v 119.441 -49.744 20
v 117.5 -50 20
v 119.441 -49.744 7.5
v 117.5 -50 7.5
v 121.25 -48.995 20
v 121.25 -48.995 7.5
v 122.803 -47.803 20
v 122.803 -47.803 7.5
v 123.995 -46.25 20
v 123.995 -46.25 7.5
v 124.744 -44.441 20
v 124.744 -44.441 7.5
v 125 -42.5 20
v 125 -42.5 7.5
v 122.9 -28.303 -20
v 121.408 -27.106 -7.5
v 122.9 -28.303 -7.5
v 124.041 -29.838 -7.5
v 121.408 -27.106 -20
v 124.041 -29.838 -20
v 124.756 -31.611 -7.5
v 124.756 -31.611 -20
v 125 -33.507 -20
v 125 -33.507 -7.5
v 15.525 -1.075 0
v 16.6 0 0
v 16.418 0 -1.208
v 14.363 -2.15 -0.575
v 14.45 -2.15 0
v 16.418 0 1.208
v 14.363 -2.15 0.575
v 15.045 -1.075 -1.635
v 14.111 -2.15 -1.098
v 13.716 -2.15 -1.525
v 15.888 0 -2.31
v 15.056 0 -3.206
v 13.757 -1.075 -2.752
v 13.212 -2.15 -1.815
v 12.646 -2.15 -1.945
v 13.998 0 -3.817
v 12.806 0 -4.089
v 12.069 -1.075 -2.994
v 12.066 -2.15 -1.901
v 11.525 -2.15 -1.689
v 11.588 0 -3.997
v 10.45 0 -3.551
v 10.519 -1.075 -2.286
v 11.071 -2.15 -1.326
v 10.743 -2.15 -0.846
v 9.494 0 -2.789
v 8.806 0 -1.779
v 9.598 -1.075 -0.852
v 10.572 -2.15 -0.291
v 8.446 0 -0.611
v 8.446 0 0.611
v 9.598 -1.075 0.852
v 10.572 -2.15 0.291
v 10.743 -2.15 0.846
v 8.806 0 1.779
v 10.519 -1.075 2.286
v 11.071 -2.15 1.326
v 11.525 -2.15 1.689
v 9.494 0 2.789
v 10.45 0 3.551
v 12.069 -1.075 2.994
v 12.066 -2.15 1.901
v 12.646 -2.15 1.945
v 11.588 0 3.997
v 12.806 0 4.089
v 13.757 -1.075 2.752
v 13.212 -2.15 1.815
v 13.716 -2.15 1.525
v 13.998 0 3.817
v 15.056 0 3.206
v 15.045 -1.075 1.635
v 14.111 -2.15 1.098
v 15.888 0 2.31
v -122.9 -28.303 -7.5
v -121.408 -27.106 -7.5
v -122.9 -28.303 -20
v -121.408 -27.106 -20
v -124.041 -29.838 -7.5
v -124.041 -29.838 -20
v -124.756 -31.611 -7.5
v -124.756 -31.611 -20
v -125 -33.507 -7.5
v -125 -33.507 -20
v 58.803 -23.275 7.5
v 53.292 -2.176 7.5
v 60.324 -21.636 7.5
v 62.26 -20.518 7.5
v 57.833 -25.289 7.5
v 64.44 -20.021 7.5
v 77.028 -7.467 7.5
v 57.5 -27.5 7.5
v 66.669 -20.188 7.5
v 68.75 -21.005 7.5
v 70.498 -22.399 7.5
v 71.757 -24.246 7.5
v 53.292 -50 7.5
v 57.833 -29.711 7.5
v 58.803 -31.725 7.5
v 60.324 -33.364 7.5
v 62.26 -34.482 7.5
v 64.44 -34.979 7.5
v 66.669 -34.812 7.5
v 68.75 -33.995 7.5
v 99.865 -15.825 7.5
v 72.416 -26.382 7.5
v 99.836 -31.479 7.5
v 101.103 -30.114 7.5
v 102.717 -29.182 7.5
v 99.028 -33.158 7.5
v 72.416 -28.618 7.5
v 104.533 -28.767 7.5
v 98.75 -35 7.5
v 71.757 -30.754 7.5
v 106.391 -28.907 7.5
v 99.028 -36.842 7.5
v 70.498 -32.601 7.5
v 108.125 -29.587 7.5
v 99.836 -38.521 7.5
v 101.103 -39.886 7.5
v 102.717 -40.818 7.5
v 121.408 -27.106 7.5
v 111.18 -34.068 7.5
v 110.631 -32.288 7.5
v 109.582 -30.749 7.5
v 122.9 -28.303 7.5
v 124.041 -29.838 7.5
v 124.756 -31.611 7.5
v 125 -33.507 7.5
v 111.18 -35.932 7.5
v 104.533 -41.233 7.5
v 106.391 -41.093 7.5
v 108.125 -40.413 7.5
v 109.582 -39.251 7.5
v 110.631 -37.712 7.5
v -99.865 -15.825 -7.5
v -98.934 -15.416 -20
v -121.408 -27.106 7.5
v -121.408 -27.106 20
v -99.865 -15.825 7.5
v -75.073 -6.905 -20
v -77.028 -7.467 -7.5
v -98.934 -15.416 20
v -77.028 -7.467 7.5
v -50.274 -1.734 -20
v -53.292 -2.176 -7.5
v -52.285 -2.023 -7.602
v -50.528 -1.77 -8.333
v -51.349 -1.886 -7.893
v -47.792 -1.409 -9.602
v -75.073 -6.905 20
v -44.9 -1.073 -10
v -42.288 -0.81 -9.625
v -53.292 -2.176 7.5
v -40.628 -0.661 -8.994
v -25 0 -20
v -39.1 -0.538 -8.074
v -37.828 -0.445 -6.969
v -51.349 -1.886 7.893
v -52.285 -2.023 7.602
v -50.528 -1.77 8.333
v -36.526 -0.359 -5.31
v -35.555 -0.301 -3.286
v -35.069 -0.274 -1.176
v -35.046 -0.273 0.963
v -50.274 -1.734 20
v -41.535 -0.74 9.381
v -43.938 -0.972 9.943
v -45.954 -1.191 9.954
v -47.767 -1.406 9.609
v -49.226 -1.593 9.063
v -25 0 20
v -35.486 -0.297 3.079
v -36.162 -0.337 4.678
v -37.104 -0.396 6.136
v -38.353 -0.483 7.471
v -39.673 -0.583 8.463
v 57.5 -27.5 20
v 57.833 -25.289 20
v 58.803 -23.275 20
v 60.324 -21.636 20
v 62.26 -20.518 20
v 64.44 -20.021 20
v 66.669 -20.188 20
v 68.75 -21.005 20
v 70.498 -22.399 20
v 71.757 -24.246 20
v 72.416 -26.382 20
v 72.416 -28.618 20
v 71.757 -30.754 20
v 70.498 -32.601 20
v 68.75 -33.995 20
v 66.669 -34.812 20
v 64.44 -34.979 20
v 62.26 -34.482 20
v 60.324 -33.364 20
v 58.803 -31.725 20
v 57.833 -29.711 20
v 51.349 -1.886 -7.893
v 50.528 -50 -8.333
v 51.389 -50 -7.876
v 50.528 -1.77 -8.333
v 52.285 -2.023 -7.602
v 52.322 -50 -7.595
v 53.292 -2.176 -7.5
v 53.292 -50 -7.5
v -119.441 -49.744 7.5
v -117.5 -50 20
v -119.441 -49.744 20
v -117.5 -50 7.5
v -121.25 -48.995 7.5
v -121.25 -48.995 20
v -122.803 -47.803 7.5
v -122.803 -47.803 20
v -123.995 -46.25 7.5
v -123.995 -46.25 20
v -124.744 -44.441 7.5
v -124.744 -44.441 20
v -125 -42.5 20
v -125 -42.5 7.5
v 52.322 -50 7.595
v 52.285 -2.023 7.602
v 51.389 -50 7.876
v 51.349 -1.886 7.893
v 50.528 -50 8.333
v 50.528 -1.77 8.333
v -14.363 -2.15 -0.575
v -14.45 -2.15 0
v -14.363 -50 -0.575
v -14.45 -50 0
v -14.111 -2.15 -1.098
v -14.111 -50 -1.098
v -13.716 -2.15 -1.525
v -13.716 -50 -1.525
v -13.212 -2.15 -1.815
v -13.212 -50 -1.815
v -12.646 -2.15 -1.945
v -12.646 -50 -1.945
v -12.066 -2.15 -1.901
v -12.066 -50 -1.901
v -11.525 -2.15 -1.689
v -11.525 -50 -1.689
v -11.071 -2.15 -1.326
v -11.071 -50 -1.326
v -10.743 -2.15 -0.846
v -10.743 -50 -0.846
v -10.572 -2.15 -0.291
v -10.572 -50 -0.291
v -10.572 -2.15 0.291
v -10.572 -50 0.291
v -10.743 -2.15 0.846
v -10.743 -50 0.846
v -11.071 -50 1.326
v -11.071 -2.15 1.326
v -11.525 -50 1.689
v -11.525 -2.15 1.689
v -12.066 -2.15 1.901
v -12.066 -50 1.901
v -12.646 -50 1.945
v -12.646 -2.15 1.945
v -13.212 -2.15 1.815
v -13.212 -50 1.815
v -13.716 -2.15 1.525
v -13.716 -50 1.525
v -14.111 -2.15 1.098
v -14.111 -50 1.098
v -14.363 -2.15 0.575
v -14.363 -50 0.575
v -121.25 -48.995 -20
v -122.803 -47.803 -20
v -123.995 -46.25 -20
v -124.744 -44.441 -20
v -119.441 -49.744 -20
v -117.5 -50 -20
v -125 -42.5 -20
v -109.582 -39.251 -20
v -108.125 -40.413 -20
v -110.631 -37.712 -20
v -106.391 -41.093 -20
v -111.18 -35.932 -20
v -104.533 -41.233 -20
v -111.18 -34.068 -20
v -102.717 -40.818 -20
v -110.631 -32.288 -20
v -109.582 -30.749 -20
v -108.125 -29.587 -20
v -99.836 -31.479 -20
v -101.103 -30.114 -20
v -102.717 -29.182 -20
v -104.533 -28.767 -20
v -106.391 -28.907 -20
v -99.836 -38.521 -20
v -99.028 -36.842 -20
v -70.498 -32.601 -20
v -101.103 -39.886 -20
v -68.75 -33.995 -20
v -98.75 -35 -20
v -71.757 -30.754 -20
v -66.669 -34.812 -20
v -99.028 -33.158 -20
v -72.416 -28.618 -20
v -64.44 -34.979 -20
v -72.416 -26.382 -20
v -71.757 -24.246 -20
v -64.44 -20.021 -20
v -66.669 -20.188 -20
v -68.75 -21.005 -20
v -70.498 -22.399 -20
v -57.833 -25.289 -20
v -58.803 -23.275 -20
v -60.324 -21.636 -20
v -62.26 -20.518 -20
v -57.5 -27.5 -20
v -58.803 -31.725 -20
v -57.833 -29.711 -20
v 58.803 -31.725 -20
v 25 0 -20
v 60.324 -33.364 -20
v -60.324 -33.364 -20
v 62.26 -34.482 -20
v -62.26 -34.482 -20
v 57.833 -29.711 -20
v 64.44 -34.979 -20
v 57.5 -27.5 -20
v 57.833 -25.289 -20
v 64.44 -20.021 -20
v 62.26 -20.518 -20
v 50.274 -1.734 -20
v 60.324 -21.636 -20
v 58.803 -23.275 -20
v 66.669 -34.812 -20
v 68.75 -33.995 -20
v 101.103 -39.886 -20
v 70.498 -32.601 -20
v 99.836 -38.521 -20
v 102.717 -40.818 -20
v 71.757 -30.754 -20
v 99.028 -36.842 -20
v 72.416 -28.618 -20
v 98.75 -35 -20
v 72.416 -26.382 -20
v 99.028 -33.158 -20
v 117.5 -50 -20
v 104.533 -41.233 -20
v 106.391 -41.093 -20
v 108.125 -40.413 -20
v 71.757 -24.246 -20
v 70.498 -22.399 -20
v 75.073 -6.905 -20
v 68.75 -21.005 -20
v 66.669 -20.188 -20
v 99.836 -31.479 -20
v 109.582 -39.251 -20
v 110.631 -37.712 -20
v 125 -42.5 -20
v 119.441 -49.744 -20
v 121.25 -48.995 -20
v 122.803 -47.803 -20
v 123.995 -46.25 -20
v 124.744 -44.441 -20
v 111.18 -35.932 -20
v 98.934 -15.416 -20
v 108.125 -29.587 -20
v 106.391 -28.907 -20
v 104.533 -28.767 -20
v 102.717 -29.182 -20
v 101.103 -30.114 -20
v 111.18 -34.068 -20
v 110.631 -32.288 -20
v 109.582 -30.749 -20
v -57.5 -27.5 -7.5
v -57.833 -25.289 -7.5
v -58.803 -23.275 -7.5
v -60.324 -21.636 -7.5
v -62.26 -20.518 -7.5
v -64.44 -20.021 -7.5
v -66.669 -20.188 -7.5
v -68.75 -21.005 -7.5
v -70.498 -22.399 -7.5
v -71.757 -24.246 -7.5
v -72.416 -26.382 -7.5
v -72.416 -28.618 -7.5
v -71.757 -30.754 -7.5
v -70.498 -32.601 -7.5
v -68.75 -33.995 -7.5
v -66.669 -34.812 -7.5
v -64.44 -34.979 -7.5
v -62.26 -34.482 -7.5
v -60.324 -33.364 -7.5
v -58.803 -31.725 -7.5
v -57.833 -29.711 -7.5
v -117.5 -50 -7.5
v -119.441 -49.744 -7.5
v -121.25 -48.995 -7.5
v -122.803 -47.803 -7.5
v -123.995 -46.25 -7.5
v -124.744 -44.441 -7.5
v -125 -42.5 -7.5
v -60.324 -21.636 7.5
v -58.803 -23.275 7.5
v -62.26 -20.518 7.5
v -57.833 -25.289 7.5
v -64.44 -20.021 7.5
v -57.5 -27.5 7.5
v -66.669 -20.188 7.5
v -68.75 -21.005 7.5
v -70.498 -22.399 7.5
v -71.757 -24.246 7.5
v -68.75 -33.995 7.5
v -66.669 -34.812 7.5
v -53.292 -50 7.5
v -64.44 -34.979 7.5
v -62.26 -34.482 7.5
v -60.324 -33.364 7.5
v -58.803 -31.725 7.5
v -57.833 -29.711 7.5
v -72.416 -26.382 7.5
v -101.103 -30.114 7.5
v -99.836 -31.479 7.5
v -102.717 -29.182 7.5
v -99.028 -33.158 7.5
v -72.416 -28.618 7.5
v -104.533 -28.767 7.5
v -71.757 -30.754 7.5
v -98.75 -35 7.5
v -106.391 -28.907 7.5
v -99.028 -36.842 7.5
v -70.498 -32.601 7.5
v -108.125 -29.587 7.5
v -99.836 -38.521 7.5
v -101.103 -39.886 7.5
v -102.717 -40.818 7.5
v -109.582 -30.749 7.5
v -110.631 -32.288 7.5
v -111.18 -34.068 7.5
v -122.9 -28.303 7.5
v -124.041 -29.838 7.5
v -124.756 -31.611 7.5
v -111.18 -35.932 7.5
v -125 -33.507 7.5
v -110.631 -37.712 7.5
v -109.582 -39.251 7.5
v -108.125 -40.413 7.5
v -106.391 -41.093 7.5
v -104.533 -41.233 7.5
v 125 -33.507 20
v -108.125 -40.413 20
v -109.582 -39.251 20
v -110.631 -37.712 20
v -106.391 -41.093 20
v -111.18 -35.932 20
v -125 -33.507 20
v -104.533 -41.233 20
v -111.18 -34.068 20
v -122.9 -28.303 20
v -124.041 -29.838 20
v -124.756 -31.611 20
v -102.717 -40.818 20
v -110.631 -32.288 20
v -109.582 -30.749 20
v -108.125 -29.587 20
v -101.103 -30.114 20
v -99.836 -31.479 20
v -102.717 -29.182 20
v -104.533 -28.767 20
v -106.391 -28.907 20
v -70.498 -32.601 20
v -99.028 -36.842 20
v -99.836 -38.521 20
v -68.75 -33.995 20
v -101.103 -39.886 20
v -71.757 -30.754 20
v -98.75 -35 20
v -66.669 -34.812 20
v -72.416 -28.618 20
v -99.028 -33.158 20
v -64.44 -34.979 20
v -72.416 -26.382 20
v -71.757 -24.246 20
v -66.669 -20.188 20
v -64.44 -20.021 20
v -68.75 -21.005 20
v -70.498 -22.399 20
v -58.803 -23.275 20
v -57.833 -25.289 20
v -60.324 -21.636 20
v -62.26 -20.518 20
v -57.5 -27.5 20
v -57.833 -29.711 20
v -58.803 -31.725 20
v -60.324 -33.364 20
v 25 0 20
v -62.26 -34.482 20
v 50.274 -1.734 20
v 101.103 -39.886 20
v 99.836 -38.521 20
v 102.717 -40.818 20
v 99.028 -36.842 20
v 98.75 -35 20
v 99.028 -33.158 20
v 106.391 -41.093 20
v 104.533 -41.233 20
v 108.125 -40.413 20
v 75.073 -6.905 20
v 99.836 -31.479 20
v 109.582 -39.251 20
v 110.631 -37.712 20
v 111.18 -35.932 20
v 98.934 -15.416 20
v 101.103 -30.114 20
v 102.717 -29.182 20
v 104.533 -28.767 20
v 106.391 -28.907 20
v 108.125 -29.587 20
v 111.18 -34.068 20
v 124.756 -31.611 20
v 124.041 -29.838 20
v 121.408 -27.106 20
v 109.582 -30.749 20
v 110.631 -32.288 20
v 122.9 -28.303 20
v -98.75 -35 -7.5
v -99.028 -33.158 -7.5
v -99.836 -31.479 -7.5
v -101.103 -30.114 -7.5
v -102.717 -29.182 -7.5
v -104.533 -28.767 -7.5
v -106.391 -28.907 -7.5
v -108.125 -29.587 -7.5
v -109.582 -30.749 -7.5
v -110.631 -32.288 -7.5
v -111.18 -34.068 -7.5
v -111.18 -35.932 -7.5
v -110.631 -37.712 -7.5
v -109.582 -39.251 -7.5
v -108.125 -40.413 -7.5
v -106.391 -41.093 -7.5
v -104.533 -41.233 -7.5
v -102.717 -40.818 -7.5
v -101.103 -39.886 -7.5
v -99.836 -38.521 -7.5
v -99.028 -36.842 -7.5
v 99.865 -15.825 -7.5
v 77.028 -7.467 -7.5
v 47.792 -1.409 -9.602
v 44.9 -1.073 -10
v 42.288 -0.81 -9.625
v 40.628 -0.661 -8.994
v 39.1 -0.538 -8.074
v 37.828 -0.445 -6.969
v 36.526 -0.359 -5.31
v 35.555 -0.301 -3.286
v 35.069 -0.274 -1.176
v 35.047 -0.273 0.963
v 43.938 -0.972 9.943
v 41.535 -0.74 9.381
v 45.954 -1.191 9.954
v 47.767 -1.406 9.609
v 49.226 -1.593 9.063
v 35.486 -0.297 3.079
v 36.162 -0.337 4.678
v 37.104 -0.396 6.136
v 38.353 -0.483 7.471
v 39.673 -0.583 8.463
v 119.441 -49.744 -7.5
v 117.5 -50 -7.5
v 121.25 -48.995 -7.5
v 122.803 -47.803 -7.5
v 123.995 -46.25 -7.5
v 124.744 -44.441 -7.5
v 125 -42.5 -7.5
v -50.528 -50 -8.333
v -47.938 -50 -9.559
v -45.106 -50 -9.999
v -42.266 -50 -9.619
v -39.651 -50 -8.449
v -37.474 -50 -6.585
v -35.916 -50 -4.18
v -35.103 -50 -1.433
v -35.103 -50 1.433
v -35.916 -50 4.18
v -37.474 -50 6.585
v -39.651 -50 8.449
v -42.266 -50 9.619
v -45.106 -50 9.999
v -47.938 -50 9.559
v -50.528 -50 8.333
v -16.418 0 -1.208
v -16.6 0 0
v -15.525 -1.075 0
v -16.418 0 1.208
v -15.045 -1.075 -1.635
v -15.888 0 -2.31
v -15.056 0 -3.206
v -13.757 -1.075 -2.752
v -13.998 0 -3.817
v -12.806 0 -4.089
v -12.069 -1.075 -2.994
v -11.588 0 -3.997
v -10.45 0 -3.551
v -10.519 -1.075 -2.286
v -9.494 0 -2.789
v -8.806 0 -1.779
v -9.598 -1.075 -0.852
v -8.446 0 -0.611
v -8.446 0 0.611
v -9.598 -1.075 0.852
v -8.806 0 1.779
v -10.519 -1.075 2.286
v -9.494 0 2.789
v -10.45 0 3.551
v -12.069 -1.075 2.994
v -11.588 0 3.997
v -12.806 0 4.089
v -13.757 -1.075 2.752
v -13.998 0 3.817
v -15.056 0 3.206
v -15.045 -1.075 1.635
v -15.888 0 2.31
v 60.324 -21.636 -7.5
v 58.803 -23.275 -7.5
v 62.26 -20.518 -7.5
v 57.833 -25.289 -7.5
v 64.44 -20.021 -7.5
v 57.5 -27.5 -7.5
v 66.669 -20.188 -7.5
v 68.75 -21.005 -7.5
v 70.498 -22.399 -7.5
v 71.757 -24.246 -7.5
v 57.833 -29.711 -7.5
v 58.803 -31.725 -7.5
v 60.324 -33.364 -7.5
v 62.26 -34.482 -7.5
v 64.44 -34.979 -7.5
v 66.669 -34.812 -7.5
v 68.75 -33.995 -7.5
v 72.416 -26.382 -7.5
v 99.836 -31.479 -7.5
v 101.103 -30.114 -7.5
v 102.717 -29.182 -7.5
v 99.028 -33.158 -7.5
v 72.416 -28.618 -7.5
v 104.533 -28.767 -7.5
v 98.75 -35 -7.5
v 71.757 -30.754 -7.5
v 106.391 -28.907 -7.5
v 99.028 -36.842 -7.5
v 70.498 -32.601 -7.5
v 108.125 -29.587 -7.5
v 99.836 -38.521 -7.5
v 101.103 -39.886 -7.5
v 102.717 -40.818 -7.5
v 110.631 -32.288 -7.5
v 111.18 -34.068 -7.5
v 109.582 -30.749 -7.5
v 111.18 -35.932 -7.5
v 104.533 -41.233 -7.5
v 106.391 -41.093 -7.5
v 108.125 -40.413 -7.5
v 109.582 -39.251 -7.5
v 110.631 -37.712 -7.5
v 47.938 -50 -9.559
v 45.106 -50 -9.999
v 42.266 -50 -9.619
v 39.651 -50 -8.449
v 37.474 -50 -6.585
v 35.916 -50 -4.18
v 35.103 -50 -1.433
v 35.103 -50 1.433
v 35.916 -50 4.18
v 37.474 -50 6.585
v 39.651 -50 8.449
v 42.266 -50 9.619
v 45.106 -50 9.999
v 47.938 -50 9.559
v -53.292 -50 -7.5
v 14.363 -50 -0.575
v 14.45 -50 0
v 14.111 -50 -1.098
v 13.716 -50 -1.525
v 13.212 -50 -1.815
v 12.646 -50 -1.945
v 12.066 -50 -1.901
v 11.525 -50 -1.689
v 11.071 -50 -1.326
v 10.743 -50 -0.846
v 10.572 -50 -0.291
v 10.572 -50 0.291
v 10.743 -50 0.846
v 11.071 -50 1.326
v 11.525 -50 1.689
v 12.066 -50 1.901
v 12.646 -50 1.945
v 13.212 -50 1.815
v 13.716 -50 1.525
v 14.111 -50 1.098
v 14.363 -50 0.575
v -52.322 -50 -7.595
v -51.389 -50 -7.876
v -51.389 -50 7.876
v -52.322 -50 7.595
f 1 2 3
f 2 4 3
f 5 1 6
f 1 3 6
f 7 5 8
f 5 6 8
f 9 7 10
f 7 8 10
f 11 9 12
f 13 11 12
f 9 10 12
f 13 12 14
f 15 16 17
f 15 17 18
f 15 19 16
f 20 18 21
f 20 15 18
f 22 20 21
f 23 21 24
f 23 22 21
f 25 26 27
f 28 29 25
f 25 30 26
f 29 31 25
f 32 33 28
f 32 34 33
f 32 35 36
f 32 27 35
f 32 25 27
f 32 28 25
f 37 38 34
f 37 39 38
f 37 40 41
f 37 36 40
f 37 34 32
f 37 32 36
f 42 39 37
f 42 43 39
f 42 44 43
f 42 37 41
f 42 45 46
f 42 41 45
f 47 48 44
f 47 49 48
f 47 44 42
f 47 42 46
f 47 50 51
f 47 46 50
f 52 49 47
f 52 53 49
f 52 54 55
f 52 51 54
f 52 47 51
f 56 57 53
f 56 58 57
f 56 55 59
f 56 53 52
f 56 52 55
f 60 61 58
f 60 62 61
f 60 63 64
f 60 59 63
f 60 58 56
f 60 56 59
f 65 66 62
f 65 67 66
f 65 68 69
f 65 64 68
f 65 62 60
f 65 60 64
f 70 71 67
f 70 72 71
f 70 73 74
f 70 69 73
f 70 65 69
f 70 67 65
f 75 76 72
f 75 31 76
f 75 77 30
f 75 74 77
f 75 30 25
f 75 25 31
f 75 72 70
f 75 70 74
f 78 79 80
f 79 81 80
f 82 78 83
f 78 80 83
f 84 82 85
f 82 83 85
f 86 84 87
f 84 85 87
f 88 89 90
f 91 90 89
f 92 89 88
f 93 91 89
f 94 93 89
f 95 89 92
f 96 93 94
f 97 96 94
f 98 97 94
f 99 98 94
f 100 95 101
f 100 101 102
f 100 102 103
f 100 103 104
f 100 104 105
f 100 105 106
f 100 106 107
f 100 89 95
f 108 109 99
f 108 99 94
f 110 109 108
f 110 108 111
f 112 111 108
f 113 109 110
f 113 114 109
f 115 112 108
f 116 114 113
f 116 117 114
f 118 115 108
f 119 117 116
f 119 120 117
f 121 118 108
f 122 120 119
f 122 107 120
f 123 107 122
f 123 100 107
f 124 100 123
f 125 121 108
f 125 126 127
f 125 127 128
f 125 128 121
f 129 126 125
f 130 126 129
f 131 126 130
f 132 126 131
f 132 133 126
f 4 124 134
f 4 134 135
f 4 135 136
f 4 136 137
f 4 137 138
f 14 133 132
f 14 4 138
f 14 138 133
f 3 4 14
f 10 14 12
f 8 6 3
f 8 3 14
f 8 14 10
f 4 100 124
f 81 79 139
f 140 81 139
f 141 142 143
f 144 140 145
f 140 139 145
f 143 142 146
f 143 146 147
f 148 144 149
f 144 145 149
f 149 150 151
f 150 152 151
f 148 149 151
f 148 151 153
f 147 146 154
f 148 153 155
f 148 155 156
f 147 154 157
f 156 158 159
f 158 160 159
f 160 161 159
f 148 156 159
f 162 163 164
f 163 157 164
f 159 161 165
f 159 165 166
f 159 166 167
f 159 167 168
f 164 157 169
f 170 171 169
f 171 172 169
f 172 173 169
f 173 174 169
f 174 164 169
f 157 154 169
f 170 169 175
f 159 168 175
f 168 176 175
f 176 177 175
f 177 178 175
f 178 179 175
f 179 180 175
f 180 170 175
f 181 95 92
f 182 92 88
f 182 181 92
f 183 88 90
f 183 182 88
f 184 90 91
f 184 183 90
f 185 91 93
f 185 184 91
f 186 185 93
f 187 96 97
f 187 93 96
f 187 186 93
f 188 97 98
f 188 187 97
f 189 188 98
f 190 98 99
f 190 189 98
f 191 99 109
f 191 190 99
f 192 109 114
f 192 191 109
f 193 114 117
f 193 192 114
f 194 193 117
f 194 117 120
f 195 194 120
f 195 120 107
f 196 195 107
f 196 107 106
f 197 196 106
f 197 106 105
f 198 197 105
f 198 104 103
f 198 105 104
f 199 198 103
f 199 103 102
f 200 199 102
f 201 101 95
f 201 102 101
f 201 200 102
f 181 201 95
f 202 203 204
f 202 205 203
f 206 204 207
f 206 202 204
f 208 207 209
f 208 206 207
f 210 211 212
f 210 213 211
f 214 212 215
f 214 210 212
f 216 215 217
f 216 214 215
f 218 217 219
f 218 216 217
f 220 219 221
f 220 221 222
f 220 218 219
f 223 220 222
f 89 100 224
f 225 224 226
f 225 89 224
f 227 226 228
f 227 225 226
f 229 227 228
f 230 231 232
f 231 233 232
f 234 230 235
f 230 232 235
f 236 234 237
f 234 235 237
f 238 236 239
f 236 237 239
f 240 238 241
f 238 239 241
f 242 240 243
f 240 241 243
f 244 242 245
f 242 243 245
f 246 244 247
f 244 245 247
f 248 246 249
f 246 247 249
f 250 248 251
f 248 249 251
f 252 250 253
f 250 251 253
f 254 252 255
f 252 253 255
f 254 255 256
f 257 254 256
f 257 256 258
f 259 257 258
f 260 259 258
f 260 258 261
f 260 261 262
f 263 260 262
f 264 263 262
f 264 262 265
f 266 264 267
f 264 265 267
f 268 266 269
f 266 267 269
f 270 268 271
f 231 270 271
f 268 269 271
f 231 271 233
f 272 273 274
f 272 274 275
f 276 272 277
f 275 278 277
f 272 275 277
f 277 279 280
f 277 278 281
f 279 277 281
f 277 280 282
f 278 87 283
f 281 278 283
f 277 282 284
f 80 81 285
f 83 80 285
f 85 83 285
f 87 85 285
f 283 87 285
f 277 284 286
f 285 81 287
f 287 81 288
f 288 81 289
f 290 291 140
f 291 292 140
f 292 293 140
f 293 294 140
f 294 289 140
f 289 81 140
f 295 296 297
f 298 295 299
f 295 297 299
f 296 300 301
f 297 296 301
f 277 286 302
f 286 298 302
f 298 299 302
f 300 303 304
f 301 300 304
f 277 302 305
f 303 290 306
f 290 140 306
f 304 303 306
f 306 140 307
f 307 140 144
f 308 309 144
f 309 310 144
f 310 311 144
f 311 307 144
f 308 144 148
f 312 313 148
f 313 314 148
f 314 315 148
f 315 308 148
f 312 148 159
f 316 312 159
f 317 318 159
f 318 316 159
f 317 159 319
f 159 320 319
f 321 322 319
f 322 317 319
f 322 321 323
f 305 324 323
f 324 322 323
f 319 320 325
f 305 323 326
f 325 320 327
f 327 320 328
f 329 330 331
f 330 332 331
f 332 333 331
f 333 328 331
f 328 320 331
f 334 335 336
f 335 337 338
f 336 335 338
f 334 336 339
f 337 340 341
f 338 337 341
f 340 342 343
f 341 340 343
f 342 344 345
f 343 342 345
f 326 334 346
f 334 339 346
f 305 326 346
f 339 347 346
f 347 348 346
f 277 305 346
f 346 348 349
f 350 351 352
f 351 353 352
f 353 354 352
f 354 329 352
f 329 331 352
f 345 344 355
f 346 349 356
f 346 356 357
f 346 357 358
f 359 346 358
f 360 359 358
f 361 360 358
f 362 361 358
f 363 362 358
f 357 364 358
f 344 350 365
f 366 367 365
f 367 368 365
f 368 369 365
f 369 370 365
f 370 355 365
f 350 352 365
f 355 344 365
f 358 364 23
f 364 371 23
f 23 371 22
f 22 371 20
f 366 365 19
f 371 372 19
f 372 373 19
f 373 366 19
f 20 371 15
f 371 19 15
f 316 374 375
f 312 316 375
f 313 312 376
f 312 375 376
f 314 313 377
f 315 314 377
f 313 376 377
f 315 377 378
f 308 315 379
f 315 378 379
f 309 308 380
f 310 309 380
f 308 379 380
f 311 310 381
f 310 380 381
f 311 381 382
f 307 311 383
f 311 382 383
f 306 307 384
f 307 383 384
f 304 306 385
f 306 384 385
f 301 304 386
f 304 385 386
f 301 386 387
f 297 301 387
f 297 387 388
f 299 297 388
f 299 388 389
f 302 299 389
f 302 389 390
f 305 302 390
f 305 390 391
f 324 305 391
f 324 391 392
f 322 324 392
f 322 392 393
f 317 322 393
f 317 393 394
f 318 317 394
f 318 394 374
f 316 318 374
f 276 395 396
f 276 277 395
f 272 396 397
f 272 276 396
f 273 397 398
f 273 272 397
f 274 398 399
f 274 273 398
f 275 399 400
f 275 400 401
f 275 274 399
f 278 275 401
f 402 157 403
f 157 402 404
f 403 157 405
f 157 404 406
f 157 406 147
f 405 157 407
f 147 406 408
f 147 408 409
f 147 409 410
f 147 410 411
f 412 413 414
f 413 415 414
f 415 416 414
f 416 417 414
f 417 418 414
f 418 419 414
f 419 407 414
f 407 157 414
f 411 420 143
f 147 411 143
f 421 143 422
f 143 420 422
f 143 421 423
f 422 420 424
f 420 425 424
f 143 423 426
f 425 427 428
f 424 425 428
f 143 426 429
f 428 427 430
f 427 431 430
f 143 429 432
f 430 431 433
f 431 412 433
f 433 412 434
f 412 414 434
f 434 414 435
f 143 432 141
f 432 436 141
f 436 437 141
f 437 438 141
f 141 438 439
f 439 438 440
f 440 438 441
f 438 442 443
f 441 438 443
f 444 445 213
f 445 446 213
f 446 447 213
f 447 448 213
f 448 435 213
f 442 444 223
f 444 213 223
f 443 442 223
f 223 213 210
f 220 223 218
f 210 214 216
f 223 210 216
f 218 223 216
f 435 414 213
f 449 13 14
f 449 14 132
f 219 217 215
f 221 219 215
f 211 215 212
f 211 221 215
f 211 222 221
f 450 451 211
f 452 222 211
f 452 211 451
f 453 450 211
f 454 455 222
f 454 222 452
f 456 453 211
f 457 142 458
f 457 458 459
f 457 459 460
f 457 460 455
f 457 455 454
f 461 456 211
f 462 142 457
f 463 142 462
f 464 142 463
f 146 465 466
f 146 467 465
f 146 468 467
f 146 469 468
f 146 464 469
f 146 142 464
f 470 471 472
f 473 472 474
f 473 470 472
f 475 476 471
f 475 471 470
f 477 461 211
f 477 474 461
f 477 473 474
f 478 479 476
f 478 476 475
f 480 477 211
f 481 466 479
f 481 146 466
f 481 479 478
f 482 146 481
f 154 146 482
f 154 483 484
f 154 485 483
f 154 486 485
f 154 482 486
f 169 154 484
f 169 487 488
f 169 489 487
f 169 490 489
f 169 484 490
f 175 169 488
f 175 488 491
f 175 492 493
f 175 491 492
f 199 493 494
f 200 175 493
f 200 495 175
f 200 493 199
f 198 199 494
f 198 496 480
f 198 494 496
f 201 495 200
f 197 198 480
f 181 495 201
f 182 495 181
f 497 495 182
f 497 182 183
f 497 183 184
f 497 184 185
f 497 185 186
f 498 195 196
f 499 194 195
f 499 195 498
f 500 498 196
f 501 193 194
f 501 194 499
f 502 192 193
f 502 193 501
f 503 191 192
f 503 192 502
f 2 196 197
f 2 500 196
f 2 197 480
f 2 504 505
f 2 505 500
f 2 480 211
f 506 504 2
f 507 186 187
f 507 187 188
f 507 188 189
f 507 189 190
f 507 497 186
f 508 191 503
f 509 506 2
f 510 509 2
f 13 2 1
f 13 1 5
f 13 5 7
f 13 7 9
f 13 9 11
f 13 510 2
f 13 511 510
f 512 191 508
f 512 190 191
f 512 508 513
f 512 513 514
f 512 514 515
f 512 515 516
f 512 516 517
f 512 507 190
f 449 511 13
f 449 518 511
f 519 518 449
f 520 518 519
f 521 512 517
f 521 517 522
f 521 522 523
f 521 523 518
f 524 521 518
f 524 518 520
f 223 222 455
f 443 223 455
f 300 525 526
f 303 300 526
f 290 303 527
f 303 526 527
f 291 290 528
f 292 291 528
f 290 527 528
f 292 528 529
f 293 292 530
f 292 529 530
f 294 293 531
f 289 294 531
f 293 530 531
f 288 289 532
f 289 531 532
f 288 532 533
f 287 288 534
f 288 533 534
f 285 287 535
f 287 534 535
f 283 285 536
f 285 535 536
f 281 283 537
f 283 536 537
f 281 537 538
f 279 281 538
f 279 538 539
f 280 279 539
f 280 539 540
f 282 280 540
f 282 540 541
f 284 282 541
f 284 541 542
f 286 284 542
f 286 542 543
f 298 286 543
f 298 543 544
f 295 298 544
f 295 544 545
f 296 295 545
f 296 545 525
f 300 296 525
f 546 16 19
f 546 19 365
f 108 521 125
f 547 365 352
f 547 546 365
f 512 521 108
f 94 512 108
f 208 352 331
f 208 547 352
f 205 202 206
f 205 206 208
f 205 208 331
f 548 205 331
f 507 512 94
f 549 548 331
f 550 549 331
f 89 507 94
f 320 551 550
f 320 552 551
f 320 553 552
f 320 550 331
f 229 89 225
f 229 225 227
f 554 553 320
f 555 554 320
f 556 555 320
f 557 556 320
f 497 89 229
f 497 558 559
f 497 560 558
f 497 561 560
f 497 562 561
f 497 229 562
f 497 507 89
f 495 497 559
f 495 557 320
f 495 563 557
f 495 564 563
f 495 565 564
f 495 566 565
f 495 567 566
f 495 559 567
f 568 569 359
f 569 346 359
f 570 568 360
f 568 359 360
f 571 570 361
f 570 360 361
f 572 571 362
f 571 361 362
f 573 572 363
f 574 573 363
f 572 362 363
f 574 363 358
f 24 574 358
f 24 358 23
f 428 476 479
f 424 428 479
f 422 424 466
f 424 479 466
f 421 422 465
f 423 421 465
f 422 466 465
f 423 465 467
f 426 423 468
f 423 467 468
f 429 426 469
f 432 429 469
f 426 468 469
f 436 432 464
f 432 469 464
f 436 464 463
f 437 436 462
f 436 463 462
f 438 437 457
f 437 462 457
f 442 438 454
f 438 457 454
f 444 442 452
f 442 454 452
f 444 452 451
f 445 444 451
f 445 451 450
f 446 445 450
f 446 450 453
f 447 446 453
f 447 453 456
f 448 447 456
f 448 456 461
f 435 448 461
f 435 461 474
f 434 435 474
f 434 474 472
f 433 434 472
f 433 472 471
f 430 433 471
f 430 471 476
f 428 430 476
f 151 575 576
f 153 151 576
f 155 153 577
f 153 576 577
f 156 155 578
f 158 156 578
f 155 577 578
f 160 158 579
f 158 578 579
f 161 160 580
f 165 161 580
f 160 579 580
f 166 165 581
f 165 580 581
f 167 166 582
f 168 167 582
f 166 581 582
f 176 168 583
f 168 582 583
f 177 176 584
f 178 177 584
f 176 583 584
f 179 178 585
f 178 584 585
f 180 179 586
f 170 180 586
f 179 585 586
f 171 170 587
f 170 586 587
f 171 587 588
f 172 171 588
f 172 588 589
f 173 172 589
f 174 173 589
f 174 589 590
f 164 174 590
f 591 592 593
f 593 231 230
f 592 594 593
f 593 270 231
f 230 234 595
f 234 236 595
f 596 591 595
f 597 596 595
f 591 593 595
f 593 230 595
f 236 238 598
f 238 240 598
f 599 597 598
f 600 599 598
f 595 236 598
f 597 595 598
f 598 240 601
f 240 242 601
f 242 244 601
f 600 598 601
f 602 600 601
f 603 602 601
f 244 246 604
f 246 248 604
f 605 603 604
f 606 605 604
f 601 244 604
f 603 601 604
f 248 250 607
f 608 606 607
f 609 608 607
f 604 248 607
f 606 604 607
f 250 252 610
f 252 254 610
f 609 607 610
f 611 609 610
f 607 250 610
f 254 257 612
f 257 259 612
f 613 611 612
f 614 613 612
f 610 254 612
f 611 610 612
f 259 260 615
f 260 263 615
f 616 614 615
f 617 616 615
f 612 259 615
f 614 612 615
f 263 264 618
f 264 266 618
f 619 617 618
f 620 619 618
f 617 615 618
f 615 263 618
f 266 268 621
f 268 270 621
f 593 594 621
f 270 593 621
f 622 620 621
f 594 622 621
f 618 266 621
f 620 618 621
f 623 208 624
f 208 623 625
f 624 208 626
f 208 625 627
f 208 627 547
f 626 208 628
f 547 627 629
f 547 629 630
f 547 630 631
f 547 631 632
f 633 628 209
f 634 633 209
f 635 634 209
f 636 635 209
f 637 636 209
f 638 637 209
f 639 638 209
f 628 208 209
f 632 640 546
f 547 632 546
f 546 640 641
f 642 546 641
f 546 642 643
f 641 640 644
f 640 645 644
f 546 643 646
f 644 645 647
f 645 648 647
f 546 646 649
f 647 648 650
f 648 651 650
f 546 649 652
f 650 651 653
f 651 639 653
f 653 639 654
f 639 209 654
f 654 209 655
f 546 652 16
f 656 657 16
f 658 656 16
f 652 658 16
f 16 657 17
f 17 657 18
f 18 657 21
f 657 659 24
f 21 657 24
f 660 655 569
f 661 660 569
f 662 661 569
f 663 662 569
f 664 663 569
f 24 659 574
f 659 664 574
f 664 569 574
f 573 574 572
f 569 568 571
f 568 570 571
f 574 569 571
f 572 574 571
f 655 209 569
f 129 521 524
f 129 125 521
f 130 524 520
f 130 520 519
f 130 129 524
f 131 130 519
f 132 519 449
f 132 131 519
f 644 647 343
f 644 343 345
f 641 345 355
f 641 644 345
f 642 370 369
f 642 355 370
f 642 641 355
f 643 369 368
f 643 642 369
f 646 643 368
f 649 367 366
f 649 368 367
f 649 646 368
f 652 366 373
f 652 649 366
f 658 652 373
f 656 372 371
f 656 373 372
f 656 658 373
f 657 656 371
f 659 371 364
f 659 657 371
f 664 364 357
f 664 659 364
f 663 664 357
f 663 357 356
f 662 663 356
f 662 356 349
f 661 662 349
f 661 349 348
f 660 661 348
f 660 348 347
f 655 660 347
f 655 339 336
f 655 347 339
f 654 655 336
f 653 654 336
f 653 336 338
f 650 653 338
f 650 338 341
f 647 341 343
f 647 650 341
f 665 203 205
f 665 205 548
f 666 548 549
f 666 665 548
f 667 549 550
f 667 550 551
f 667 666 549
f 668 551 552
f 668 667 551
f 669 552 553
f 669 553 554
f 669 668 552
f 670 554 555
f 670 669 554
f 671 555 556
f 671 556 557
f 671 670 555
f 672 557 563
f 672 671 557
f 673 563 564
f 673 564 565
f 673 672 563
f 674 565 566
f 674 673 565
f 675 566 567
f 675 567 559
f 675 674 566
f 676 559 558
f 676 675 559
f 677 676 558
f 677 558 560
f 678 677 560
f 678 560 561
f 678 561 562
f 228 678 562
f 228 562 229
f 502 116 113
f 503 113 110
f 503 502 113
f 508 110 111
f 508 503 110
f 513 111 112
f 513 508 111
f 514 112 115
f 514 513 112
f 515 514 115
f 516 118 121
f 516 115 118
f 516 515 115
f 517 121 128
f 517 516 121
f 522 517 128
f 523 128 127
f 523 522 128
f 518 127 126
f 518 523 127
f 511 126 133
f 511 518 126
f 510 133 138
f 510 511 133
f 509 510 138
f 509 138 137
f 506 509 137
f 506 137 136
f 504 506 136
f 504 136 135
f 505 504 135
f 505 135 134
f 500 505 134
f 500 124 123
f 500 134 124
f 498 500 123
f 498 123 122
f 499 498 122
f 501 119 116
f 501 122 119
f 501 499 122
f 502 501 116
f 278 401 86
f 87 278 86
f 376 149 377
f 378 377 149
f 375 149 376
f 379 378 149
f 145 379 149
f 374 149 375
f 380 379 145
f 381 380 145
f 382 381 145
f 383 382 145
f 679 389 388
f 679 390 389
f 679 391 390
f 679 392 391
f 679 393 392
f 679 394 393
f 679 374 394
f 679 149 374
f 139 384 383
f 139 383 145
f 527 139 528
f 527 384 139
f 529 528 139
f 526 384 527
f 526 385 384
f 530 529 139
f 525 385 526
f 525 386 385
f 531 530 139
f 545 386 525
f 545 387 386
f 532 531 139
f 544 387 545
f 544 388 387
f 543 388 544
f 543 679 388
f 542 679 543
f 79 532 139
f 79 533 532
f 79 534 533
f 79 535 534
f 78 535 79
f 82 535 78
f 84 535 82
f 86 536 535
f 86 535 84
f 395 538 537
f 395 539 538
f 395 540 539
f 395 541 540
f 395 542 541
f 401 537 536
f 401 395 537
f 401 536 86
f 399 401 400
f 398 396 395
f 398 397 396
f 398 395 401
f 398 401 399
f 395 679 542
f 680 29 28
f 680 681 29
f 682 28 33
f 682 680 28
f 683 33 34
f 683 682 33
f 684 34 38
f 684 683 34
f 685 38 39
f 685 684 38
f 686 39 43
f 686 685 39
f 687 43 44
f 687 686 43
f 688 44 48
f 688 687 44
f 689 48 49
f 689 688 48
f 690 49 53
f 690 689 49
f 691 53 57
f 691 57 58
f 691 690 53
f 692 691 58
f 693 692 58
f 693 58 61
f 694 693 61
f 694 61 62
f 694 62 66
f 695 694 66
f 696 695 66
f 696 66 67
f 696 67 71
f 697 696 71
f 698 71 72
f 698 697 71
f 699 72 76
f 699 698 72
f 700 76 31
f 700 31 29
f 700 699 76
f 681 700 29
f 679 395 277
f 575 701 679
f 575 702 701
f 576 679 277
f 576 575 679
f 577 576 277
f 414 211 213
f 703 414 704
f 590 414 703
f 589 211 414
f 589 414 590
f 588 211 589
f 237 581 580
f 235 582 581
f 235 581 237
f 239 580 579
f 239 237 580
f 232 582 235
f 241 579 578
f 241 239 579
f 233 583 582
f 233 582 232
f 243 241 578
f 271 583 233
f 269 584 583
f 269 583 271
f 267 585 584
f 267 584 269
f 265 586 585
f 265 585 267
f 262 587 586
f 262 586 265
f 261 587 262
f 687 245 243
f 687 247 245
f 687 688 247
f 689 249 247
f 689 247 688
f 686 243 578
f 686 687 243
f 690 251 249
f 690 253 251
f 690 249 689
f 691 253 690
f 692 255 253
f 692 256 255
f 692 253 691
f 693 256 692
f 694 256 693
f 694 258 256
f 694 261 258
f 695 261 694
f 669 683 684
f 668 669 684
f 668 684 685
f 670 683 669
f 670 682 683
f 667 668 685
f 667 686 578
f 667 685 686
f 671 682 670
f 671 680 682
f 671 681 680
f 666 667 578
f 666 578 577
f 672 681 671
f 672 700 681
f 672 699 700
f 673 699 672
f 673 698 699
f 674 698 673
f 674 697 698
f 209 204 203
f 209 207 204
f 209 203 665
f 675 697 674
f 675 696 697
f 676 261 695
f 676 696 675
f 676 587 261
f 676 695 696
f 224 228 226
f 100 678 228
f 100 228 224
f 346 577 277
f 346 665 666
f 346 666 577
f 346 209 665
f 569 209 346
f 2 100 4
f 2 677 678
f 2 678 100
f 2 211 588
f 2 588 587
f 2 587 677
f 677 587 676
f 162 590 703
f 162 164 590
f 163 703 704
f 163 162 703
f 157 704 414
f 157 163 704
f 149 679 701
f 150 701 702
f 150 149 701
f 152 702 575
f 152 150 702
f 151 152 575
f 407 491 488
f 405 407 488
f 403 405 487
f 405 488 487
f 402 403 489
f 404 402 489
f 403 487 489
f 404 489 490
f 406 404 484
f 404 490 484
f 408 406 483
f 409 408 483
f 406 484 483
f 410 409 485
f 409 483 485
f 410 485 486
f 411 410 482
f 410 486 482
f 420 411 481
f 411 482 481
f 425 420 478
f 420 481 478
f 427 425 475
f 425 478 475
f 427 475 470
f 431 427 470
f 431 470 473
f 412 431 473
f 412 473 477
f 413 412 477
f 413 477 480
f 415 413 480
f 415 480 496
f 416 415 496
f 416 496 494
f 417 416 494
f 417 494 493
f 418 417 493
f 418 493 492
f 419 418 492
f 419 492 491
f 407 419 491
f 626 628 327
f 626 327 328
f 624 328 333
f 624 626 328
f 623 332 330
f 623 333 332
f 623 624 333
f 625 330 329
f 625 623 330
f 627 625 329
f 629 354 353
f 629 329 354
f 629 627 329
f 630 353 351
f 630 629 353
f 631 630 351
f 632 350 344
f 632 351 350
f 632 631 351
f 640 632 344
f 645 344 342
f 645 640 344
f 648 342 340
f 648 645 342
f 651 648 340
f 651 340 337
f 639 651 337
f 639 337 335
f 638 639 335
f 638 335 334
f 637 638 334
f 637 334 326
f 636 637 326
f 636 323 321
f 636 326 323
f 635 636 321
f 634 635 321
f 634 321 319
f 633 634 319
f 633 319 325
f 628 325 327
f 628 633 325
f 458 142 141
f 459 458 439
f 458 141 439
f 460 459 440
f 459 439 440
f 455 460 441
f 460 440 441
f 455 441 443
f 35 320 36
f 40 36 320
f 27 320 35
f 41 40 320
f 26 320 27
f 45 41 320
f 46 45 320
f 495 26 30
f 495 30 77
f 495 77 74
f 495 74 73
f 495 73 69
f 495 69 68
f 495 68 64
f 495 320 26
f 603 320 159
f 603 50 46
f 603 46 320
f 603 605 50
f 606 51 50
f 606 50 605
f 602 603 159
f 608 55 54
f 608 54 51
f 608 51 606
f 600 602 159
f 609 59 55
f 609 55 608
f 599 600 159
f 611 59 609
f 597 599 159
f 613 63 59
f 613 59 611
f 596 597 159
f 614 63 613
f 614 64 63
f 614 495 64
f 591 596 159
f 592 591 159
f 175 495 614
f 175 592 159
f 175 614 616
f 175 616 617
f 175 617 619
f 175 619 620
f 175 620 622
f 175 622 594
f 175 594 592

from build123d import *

# Parameters (mm, degrees)
BOSS_EXTRUDE1_DEPTH                               = 20
SKETCH2_R                                         = 6.25
SKETCH2_R_2                                       = 7.5
CUT_EXTRUDE1_DEPTH                                = 141.445719052
SKETCH3_R                                         = 10
SKETCH3_W                                         = 80
SKETCH3_H                                         = 15
CUT_EXTRUDE3_DEPTH                                = 137.106575888
CSK_FOR_M3_5_FLAT_HEAD_MACHINE_SCREW1_D           = 3.9
CSK_FOR_M3_5_FLAT_HEAD_MACHINE_SCREW1_CSINK_D     = 8.2
CSK_FOR_M3_5_FLAT_HEAD_MACHINE_SCREW1_CSINK_ANGLE = 90
FILLET2_R                                         = 7.5
FILLET4_R                                         = 5
FILLET2_OF_MIRROR2_R                              = 7.5
FILLET4_OF_MIRROR2_R                              = 5


with BuildPart() as part:
    # Sketch1 → Boss-Extrude1 (new, symmetric)
    with BuildSketch(Plane.XY):
        with BuildLine():
            Line((0, -50), (-125, -50))
            Line((-125, -50), (-125, -29.356175837))
            ThreePointArc((-125, -29.356175837), (-77.109944012, -7.490693948), (-25, 0))
            Line((-25, 0), (0, 0))
            Line((0, 0), (0, -50))
        make_face()
    boss_extrude1 = extrude(amount=BOSS_EXTRUDE1_DEPTH, both=True)

    # Sketch2 → Cut-Extrude1 (cut, through all)
    with BuildSketch(Plane.XY.offset(20)):
        with Locations((-105, -35)):
            Circle(SKETCH2_R)
        with Locations((-65, -27.5)):
            Circle(SKETCH2_R_2)
    cut_extrude1 = extrude(amount=-CUT_EXTRUDE1_DEPTH, mode=Mode.SUBTRACT)

    # Sketch3 → Cut-Extrude3 (cut, through all)
    with BuildSketch(Plane(origin=(0, -50, 0), x_dir=(-1, 0, 0), z_dir=(0, -1, 0))):
        with Locations((45, 0)):
            Circle(SKETCH3_R)
        with Locations((85, 0)):
            Rectangle(SKETCH3_W, SKETCH3_H)
    cut_extrude3 = extrude(amount=-CUT_EXTRUDE3_DEPTH, mode=Mode.SUBTRACT)

    # CSK for M3.5 Flat Head Machine Screw1 (through all)
    with Locations(Plane(origin=(0, 0, 0), x_dir=(1, 0, 0), z_dir=(0, 1, 0))):
        with Locations((-12.5, 0)):
            csk_for_m3_5_flat_head_machine_screw1 = CounterSinkHole(CSK_FOR_M3_5_FLAT_HEAD_MACHINE_SCREW1_D / 2, CSK_FOR_M3_5_FLAT_HEAD_MACHINE_SCREW1_CSINK_D / 2, counter_sink_angle=CSK_FOR_M3_5_FLAT_HEAD_MACHINE_SCREW1_CSINK_ANGLE)

    # Fillet2
    fillet2_edges = [part.edges().sort_by_distance(p)[0] for p in [
        (-125, -50, -13.75),
        (-125, -29.356175837, -13.75),
        (-125, -50, 13.75),
        (-125, -29.356175837, 13.75),
    ]]
    fillet(fillet2_edges, radius=FILLET2_R)

    # Fillet4
    fillet4_edges = [part.edges().sort_by_distance(p)[0] for p in [
        (-51.614378278, -25.96220061, 7.5),
        (-51.614378278, -25.96220061, -7.5),
    ]]
    fillet(fillet4_edges, radius=FILLET4_R)

    # Mirror2: Boss-Extrude1, Cut-Extrude1, Cut-Extrude3, CSK for M3.5 Flat Head Machine Screw1 across plane
    add(boss_extrude1.mirror(Plane(origin=(0, 0, 20), x_dir=(0, 0, 1), z_dir=(-1, 0, 0))))
    add(cut_extrude1.mirror(Plane(origin=(0, 0, 20), x_dir=(0, 0, 1), z_dir=(-1, 0, 0))), mode=Mode.SUBTRACT)
    add(cut_extrude3.mirror(Plane(origin=(0, 0, 20), x_dir=(0, 0, 1), z_dir=(-1, 0, 0))), mode=Mode.SUBTRACT)
    add(csk_for_m3_5_flat_head_machine_screw1.mirror(Plane(origin=(0, 0, 20), x_dir=(0, 0, 1), z_dir=(-1, 0, 0))), mode=Mode.SUBTRACT)

    # Fillet2 of Mirror2
    fillet2_of_mirror2_edges = [part.edges().sort_by_distance(p)[0] for p in [
        (125, -50, -13.75),
        (125, -29.356175837, -13.75),
        (125, -50, 13.75),
        (125, -29.356175837, 13.75),
    ]]
    fillet(fillet2_of_mirror2_edges, radius=FILLET2_OF_MIRROR2_R)

    # Fillet4 of Mirror2
    fillet4_of_mirror2_edges = [part.edges().sort_by_distance(p)[0] for p in [
        (51.614378278, -25.96220061, 7.5),
        (51.614378278, -25.96220061, -7.5),
    ]]
    fillet(fillet4_of_mirror2_edges, radius=FILLET4_OF_MIRROR2_R)


solid = part.part
